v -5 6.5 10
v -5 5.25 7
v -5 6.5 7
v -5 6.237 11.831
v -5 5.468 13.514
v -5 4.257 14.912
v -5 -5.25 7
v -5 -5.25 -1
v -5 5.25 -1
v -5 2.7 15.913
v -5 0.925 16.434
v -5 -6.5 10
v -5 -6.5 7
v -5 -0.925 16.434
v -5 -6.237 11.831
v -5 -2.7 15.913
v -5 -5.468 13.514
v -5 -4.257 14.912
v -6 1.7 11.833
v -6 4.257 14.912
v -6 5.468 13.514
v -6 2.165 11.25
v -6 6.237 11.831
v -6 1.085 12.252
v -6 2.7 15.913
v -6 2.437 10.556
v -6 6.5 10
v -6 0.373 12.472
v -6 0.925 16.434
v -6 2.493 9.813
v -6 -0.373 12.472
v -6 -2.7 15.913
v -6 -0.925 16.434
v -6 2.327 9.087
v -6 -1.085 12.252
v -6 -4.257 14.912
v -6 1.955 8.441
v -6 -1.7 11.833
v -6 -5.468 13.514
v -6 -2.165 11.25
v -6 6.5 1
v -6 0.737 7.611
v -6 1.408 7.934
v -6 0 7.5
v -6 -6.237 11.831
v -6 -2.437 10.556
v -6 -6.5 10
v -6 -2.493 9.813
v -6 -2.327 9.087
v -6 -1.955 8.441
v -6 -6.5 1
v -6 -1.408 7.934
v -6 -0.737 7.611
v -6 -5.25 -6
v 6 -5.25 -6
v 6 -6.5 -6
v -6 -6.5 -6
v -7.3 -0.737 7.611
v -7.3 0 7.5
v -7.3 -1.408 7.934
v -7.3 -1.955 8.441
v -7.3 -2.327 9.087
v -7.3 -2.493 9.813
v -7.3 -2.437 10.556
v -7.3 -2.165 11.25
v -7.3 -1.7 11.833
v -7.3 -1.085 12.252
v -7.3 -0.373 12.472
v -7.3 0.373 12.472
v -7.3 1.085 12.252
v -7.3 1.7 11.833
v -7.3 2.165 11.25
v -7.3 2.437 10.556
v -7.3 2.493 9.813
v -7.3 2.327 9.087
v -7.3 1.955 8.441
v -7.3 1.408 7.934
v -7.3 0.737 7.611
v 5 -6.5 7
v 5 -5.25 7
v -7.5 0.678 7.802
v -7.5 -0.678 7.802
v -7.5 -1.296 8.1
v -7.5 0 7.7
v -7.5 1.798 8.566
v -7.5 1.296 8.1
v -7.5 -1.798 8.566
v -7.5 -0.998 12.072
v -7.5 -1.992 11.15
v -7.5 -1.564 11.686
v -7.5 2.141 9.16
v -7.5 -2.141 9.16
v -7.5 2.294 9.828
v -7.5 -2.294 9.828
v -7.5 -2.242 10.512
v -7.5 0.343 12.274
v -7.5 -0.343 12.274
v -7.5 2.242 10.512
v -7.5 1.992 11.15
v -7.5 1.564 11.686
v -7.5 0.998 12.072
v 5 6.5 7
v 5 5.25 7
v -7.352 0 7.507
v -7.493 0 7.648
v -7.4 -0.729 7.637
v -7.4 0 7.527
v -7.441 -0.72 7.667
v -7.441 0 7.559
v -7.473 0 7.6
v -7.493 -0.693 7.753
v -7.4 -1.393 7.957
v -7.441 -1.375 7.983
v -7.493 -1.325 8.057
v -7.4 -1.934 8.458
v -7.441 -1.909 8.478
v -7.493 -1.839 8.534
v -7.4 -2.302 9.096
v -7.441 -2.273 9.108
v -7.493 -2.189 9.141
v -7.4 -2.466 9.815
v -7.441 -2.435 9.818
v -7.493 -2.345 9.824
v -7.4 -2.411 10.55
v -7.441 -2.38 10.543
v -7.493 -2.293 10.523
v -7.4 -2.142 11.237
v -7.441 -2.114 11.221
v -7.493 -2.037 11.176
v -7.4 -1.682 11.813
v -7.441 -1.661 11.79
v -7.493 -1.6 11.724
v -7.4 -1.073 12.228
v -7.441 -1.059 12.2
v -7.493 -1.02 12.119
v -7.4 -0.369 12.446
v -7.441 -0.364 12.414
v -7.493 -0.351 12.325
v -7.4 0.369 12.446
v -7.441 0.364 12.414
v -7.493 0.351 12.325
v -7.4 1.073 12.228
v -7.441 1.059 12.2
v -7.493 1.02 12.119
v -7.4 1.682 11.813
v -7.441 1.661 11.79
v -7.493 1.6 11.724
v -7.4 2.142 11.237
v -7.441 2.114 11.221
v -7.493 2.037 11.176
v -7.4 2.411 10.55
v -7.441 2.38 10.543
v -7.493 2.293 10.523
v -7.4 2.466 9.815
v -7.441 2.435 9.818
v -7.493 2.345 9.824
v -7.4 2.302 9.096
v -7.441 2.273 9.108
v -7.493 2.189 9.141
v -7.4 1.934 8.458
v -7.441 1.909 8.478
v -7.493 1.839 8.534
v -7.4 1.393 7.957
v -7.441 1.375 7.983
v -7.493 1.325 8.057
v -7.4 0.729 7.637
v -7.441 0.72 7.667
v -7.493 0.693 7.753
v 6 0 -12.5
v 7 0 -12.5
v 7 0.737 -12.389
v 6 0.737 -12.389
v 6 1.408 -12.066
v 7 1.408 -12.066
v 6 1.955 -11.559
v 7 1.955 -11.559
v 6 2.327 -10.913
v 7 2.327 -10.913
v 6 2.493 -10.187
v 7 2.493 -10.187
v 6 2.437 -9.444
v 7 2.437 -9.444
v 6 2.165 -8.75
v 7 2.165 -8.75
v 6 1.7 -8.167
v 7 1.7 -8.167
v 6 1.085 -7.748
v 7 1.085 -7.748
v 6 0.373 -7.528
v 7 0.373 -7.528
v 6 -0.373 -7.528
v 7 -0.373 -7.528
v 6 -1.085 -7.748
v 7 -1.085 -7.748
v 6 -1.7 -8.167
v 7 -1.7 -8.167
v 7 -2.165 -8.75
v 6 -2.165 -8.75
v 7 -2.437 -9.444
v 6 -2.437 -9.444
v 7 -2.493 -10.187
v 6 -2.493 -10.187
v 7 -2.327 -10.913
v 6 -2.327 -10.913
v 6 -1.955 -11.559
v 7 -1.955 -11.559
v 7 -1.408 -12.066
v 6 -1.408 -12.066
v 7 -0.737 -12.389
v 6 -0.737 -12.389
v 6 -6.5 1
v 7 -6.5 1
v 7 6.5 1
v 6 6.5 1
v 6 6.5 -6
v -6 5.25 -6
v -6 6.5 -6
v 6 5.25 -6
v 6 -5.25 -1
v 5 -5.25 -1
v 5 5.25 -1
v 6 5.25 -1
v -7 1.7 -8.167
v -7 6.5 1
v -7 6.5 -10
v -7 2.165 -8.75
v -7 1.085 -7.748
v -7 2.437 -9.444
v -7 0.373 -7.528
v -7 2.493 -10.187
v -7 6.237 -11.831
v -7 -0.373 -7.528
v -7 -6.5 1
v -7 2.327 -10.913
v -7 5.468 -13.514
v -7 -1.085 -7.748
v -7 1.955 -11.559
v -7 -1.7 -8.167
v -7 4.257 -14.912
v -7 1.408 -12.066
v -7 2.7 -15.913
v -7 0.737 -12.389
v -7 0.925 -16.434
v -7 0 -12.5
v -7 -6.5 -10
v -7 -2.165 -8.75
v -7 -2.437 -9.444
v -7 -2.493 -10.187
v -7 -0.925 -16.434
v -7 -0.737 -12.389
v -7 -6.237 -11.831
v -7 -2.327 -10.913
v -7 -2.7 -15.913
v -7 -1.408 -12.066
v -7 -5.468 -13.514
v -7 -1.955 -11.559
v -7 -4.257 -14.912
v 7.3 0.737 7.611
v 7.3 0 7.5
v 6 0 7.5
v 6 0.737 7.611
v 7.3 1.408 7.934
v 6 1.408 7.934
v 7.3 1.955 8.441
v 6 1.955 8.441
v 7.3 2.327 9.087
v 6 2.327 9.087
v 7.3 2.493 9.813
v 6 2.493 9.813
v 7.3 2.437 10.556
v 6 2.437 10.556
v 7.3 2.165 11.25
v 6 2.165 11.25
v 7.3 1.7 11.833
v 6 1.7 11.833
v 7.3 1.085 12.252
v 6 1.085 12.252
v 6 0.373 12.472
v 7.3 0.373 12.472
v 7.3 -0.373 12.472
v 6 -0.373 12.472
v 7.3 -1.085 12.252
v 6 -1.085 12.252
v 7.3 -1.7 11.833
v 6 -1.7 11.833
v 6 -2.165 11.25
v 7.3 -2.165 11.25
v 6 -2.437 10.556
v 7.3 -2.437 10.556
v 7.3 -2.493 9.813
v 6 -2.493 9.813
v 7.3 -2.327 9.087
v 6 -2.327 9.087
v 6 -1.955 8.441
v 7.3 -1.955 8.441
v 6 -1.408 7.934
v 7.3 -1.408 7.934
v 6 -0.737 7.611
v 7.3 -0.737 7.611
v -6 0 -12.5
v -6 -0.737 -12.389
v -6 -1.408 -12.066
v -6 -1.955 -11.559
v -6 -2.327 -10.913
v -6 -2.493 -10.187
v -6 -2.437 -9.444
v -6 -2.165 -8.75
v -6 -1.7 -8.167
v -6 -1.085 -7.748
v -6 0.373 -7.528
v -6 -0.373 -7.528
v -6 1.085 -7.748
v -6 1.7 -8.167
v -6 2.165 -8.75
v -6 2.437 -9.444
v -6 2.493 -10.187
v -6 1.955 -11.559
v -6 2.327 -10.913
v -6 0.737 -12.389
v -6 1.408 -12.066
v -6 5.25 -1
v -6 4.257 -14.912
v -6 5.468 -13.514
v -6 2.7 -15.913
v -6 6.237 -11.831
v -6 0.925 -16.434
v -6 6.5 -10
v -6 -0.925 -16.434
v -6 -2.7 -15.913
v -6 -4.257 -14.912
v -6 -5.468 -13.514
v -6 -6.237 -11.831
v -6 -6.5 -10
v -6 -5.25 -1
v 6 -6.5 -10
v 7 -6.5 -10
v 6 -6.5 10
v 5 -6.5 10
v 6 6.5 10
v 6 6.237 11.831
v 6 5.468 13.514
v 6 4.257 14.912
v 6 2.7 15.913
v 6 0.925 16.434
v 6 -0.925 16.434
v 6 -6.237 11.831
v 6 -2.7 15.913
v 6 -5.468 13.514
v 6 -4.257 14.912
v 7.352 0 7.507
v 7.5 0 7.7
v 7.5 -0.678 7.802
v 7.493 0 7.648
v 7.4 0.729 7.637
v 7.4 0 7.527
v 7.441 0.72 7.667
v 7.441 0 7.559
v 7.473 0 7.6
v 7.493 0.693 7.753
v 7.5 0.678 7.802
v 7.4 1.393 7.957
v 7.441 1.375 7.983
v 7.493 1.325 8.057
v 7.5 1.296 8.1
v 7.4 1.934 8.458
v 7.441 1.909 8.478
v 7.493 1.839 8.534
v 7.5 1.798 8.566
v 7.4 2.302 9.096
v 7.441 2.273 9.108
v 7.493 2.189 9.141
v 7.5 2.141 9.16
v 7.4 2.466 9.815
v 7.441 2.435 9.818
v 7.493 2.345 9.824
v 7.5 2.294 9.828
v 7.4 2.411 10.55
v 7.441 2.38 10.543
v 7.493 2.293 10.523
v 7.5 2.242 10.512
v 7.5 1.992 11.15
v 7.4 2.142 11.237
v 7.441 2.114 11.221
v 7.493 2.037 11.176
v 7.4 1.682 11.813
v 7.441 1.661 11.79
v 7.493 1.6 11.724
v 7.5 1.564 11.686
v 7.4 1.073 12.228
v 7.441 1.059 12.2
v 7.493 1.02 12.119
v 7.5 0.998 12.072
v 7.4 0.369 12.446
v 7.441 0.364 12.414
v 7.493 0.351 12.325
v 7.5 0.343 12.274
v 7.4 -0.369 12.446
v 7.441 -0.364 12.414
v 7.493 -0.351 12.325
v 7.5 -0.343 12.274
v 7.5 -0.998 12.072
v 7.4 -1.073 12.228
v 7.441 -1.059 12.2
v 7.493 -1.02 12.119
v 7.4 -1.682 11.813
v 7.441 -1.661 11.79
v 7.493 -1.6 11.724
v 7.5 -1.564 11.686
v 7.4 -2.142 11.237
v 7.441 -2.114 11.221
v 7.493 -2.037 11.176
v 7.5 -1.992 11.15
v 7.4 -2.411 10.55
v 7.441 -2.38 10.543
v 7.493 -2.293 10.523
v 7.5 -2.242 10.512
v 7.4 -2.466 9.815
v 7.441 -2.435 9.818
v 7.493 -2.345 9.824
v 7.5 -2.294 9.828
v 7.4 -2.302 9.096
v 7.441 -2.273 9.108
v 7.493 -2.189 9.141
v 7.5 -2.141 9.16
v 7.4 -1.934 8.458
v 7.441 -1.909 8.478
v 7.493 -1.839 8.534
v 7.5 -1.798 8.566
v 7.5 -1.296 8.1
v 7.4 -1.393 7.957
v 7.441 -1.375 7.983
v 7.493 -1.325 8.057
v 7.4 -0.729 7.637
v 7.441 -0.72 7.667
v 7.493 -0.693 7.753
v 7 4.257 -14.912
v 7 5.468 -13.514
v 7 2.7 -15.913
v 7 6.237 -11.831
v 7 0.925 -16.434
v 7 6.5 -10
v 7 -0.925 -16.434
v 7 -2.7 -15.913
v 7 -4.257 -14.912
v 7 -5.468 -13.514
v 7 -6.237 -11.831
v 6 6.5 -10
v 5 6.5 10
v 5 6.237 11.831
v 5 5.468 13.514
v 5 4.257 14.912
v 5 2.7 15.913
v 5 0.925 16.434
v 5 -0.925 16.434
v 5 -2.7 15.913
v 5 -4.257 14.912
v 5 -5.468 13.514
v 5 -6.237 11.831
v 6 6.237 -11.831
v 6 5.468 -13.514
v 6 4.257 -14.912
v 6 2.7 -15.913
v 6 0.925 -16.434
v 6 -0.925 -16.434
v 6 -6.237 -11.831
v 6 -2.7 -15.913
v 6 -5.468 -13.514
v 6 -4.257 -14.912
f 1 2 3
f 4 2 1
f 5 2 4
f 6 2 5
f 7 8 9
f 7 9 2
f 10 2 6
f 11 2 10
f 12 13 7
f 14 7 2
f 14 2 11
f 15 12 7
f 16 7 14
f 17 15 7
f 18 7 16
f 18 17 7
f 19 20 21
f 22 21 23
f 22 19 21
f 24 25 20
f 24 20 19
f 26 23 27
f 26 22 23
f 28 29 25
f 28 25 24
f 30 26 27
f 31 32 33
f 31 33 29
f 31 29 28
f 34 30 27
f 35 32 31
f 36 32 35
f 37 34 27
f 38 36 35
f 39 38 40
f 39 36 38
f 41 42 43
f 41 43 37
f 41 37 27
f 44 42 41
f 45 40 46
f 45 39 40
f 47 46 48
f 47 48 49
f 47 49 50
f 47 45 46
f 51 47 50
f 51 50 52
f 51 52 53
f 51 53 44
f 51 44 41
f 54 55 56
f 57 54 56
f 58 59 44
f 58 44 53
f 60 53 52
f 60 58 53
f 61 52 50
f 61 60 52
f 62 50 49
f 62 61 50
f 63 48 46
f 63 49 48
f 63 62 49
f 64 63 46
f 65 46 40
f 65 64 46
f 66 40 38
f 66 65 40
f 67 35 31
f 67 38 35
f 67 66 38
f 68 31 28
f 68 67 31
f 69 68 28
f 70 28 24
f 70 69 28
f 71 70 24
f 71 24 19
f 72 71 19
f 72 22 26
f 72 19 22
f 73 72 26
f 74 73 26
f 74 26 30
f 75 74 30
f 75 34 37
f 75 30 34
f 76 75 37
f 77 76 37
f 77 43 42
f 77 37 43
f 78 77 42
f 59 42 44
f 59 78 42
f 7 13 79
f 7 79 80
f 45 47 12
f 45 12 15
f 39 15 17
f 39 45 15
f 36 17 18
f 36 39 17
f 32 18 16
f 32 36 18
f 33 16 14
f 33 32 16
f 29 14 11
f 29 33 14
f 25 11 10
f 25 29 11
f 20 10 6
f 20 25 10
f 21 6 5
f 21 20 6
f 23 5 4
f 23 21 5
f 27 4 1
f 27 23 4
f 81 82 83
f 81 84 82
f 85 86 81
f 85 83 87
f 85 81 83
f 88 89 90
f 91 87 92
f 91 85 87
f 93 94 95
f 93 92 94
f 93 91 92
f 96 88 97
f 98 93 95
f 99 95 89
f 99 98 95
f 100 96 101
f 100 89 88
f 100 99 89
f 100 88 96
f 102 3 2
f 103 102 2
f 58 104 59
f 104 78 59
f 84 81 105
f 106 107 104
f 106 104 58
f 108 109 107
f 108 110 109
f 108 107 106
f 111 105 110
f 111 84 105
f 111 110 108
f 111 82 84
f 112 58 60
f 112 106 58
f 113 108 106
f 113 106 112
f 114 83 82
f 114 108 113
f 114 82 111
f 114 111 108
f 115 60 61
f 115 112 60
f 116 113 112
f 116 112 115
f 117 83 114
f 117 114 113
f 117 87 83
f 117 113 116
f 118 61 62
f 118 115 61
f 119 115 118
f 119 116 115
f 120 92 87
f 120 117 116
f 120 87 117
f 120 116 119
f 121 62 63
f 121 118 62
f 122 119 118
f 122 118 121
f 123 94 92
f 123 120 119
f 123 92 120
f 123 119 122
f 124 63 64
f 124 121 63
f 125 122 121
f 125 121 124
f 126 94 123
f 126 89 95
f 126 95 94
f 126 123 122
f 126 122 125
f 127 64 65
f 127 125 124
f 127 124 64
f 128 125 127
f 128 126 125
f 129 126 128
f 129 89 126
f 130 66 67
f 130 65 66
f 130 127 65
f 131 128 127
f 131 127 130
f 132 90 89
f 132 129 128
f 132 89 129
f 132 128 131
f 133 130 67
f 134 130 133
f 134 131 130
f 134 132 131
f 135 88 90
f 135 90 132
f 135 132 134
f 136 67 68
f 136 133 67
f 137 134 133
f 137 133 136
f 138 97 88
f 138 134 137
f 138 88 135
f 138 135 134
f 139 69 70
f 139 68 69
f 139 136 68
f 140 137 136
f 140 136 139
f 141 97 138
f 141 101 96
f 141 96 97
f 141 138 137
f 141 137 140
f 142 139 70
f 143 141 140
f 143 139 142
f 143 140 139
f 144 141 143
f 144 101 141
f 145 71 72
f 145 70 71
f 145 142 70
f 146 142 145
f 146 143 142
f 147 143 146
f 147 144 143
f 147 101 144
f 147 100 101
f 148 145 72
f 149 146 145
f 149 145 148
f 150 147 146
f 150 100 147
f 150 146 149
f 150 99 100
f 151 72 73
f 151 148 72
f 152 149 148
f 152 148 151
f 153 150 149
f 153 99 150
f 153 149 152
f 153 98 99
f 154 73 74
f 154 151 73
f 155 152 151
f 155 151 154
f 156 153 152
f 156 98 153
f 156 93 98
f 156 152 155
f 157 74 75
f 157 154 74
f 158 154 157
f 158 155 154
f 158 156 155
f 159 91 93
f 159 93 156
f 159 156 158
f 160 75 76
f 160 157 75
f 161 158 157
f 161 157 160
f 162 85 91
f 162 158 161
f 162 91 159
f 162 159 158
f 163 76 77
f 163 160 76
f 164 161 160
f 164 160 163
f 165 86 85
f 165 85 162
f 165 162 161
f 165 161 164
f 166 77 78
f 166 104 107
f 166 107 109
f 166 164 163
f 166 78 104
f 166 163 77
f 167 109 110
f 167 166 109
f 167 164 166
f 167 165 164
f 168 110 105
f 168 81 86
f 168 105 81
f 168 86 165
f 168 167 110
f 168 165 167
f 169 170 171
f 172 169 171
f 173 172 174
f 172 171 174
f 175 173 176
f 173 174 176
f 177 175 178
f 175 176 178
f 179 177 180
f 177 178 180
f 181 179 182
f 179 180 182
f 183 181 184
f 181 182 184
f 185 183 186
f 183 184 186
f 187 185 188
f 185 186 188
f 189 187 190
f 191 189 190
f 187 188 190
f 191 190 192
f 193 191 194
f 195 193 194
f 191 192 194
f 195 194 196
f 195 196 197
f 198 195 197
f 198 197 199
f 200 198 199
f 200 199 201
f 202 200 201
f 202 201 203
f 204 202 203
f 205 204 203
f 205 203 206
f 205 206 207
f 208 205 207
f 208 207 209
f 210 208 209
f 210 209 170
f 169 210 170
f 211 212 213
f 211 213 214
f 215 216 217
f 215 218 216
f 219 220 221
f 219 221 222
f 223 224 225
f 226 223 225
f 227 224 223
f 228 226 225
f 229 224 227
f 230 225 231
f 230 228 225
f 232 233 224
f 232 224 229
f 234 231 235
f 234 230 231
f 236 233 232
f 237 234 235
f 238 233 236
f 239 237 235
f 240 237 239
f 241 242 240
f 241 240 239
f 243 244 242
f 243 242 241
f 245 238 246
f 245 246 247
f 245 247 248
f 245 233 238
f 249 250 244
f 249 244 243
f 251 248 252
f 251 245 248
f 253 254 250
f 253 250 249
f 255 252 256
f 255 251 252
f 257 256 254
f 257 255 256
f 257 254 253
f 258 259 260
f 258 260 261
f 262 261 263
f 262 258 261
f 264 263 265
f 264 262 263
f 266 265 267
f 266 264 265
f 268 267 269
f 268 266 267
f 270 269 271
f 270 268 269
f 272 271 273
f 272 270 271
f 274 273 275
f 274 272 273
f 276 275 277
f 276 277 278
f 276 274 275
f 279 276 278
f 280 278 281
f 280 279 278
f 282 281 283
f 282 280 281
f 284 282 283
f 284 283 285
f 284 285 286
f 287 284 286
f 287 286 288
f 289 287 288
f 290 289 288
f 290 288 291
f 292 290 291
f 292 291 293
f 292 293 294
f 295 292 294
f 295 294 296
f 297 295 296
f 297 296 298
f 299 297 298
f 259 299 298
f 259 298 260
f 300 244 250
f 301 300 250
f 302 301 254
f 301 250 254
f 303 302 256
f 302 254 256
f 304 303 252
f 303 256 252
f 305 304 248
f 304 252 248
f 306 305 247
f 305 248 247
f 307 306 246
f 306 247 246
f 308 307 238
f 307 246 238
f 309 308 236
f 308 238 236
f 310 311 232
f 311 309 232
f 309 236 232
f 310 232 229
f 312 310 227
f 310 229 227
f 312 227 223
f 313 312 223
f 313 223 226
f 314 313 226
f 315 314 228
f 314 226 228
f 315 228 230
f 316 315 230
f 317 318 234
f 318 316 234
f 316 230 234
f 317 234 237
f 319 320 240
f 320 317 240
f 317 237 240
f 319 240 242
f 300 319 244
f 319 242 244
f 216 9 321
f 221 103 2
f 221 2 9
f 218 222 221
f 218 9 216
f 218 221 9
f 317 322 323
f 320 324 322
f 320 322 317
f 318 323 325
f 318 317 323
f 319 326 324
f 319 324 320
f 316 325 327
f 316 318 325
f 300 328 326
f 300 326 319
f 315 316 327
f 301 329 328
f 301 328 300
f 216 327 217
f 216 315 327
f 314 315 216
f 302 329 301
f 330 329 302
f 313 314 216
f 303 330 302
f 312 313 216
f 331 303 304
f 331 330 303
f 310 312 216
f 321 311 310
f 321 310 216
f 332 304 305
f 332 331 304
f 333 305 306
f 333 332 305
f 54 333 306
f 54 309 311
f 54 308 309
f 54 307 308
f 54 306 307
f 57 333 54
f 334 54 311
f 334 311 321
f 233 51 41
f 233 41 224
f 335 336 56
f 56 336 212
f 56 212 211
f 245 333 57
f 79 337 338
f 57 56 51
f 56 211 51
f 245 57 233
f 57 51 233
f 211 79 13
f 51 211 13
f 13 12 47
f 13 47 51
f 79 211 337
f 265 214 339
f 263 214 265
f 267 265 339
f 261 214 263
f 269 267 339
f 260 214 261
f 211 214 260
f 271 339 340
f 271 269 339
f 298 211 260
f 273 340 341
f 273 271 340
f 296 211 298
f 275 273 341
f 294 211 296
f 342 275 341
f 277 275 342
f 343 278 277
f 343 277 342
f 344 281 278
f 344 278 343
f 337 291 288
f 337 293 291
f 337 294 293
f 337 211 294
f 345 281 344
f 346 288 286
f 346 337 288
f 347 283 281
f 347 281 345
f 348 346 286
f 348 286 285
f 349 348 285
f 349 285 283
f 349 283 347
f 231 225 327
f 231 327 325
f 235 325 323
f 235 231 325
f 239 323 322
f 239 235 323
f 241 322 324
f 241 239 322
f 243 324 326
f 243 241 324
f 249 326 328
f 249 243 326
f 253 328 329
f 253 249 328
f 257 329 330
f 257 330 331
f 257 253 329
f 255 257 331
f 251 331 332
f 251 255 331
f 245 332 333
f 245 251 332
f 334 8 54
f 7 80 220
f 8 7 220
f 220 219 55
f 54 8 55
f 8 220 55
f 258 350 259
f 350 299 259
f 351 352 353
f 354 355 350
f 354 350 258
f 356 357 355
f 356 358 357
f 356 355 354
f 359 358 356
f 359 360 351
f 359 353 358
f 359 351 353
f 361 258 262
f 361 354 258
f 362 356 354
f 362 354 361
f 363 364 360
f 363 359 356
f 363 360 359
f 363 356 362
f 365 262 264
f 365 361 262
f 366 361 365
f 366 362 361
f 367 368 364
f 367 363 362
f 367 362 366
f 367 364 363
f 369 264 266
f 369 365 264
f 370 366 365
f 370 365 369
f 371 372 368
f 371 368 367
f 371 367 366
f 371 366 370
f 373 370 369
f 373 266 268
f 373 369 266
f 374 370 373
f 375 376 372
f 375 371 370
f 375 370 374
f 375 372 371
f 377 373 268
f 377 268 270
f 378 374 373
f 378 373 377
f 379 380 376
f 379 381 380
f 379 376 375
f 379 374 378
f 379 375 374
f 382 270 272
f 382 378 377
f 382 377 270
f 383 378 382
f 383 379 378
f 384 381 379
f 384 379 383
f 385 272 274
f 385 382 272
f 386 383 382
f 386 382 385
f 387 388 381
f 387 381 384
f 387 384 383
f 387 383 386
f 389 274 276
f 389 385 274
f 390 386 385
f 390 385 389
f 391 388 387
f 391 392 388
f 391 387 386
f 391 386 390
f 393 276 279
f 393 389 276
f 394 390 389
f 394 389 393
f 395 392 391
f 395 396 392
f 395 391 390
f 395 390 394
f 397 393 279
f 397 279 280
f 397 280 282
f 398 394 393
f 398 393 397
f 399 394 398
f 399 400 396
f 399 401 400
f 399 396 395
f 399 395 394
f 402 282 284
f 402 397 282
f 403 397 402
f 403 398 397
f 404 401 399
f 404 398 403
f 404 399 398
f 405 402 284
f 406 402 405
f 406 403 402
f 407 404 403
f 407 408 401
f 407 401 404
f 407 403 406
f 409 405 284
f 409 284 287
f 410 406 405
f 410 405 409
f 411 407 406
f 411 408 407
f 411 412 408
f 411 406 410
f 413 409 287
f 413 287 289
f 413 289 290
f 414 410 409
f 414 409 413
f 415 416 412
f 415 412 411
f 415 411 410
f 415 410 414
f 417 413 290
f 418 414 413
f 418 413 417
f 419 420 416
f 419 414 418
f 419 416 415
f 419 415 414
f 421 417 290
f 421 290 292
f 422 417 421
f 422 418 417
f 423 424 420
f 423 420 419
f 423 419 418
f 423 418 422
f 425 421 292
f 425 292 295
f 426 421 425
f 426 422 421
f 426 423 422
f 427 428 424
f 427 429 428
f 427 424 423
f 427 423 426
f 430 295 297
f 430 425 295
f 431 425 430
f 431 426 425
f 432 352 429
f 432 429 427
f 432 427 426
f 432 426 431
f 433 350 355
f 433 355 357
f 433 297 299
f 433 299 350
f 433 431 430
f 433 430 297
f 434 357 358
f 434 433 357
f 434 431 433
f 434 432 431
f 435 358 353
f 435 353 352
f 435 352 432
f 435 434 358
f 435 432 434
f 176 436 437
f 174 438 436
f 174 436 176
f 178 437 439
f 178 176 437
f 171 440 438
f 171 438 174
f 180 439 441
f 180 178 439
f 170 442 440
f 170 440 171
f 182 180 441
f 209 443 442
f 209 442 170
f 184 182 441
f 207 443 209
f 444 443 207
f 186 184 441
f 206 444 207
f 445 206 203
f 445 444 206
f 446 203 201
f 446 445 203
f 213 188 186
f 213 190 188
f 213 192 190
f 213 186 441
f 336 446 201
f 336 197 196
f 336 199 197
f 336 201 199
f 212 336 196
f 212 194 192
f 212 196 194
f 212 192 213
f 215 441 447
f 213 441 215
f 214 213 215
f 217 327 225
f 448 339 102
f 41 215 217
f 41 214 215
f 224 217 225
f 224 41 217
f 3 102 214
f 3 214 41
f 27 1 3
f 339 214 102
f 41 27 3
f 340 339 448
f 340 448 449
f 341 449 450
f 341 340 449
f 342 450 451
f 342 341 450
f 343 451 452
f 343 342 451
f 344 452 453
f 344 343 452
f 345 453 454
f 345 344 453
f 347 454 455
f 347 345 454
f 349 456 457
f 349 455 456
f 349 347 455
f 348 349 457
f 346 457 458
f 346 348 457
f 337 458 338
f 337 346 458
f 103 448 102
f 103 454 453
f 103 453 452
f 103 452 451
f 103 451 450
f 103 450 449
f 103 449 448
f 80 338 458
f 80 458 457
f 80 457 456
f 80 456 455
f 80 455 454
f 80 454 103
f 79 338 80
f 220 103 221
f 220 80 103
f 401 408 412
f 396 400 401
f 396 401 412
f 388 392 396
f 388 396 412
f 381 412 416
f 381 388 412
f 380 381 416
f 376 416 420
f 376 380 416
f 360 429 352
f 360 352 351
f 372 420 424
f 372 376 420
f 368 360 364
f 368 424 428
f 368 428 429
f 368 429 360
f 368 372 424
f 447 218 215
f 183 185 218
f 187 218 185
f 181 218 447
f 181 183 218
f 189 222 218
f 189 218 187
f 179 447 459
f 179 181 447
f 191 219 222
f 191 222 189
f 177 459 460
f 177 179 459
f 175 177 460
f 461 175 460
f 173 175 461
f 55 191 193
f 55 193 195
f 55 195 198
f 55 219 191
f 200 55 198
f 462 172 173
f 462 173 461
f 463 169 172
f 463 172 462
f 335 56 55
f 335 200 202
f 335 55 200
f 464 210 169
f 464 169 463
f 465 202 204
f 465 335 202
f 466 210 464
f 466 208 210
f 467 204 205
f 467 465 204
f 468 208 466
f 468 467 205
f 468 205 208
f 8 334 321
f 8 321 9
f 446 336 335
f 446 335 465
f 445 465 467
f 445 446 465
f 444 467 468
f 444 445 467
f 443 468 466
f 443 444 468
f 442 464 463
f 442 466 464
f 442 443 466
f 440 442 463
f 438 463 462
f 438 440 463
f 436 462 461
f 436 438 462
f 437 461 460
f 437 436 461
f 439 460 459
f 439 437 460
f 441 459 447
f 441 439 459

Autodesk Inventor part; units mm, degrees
ref_plane "YZ Plane" through (0, 0, 0) normal (1, 0, 0) x (0, 1, 0)
ref_plane "XZ Plane" through (0, 0, 0) normal (0, 1, 0) x (-1, 0, 0)
sketch "Sketch1" plane through (0, 0, 0) normal (0, 1, 0) x (-1, 0, 0)
  line L0 (-5, 16.5) -> (-5, -1)
  line L1 (-5, -1) -> (-6, -1)
  line L2 (-6, -1) -> (-6, -16.5)
  line L3 (-6, -16.5) -> (-7, -16.5)
  line L4 (-7, -16.5) -> (-7, 1)
  line L5 (-7, 1) -> (-6, 1)
  line L6 (-6, 1) -> (-6, 16.5)
  line L7 (-6, 16.5) -> (-5, 16.5)
  line L8 (0, 14.862) -> (0, -14.862)
  line L9 (-6, 1) -> (-6, -1) construction
  point P0 (0, 0)
  point P1 (0, 0)
  point P2 (-6, 0)
  dimension "d0" = 12
  dimension "d1" = 10
  dimension "d2" = 33
  dimension "d3" = 2
  dimension "d20" = 1
extrude "Extrusion1" add sketch "Sketch1" along normal mid plane 13
sketch "Sketch2" plane through (7, -6.5, -16.5) normal (1, 0, 0) x (0, 0, -1)
  arc A0 (-26.5, 13) -> (-26.5, 0) centre (-26.5, 6.5) ccw
  line L0 (-17.5, 13) -> (-17.5, 0) projected
  line L1 (-33, 13) -> (-17.5, 13) projected
  line L2 (-33, 13) -> (-33, 0) projected
  line L3 (-17.5, 0) -> (-33, 0) projected
  line L4 (0, 13) -> (0, 0) projected
  line L5 (-17.5, 13) -> (0, 13) projected
  line L6 (-17.5, 13) -> (-17.5, 0) projected
  line L7 (0, 0) -> (-17.5, 0) projected
  arc A1 (-6.5, 0) -> (-6.5, 13) centre (-6.5, 6.5) ccw
  circle A2 centre (-6.5, 6.5) radius 2.5
  circle A3 centre (-26.5, 6.5) radius 2.5
  line L8 (-15.5, 13) -> (-33, 13) projected
  line L9 (-26.5, 13) -> (-33, 13)
  line L10 (-33, 13) -> (-33, 0)
  line L11 (0, 0) -> (-17.5, 0) projected
  line L12 (-6.5, 0) -> (0, 0)
  line L13 (0, 0) -> (0, 13)
  line L14 (-17.5, 13) -> (0, 13) projected
  line L15 (-6.5, 13) -> (0, 13)
  point P0 (-16.5, 6.5)
  dimension "d6" = 5
  dimension "d7" = 5
extrude "Extrusion2" cut sketch "Sketch2" against normal through all contours A0 L2 L1 | A0 L3 L2 | A1 L4 L7 | L5 L4 A1 | A2
extrude "Extrusion3" add sketch "Sketch2" along normal blind 0.5 and the other way blind 1.5 contours A3
ref_plane "Work Plane1" through (0, -6.5, -1) normal (-1, 0, 0) x (0, 0, 1)
mirror "Mirror1" about plane through (0, -6.5, -1) normal (-1, 0, 0)
sketch "Sketch3" plane through (6, -6.5, -1) normal (-1, 0, 0) x (0, 0, 1)
  line L0 (2, 13) -> (-9, 13) projected
  line L1 (-5, 13) -> (8, 13)
  line L2 (8, 13) -> (8, 11.75)
  line L3 (8, 11.75) -> (-5, 11.75)
  line L4 (-5, 11.75) -> (-5, 13)
  circle A0 centre (-9, 6.5) radius 2.5 projected
  circle A1 centre (11, 6.5) radius 2.5 projected
  line L5 (-9, 0) -> (2, 0) projected
  line L6 (-5, 0) -> (8, 0)
  line L7 (8, 0) -> (8, 1.25)
  line L8 (8, 1.25) -> (-5, 1.25)
  line L9 (-5, 1.25) -> (-5, 0)
  point P0 (1, 6.5)
  dimension "d15" = 4
  dimension "d16" = 10.5
  dimension "d17" = 3
extrude "Extrusion4" add sketch "Sketch3" along normal up to surface (12 mm away) contours L1 L2 L3 L4 L0 | L9 L8 L7 L6 L5
fillet "Fillet1" radius 0.2 2 edges at (7.5, 0, 12.5) (-7.5, 0, 12.5)
properties part number "Esteira-fesma-S10" material "Nylon 6/6"
